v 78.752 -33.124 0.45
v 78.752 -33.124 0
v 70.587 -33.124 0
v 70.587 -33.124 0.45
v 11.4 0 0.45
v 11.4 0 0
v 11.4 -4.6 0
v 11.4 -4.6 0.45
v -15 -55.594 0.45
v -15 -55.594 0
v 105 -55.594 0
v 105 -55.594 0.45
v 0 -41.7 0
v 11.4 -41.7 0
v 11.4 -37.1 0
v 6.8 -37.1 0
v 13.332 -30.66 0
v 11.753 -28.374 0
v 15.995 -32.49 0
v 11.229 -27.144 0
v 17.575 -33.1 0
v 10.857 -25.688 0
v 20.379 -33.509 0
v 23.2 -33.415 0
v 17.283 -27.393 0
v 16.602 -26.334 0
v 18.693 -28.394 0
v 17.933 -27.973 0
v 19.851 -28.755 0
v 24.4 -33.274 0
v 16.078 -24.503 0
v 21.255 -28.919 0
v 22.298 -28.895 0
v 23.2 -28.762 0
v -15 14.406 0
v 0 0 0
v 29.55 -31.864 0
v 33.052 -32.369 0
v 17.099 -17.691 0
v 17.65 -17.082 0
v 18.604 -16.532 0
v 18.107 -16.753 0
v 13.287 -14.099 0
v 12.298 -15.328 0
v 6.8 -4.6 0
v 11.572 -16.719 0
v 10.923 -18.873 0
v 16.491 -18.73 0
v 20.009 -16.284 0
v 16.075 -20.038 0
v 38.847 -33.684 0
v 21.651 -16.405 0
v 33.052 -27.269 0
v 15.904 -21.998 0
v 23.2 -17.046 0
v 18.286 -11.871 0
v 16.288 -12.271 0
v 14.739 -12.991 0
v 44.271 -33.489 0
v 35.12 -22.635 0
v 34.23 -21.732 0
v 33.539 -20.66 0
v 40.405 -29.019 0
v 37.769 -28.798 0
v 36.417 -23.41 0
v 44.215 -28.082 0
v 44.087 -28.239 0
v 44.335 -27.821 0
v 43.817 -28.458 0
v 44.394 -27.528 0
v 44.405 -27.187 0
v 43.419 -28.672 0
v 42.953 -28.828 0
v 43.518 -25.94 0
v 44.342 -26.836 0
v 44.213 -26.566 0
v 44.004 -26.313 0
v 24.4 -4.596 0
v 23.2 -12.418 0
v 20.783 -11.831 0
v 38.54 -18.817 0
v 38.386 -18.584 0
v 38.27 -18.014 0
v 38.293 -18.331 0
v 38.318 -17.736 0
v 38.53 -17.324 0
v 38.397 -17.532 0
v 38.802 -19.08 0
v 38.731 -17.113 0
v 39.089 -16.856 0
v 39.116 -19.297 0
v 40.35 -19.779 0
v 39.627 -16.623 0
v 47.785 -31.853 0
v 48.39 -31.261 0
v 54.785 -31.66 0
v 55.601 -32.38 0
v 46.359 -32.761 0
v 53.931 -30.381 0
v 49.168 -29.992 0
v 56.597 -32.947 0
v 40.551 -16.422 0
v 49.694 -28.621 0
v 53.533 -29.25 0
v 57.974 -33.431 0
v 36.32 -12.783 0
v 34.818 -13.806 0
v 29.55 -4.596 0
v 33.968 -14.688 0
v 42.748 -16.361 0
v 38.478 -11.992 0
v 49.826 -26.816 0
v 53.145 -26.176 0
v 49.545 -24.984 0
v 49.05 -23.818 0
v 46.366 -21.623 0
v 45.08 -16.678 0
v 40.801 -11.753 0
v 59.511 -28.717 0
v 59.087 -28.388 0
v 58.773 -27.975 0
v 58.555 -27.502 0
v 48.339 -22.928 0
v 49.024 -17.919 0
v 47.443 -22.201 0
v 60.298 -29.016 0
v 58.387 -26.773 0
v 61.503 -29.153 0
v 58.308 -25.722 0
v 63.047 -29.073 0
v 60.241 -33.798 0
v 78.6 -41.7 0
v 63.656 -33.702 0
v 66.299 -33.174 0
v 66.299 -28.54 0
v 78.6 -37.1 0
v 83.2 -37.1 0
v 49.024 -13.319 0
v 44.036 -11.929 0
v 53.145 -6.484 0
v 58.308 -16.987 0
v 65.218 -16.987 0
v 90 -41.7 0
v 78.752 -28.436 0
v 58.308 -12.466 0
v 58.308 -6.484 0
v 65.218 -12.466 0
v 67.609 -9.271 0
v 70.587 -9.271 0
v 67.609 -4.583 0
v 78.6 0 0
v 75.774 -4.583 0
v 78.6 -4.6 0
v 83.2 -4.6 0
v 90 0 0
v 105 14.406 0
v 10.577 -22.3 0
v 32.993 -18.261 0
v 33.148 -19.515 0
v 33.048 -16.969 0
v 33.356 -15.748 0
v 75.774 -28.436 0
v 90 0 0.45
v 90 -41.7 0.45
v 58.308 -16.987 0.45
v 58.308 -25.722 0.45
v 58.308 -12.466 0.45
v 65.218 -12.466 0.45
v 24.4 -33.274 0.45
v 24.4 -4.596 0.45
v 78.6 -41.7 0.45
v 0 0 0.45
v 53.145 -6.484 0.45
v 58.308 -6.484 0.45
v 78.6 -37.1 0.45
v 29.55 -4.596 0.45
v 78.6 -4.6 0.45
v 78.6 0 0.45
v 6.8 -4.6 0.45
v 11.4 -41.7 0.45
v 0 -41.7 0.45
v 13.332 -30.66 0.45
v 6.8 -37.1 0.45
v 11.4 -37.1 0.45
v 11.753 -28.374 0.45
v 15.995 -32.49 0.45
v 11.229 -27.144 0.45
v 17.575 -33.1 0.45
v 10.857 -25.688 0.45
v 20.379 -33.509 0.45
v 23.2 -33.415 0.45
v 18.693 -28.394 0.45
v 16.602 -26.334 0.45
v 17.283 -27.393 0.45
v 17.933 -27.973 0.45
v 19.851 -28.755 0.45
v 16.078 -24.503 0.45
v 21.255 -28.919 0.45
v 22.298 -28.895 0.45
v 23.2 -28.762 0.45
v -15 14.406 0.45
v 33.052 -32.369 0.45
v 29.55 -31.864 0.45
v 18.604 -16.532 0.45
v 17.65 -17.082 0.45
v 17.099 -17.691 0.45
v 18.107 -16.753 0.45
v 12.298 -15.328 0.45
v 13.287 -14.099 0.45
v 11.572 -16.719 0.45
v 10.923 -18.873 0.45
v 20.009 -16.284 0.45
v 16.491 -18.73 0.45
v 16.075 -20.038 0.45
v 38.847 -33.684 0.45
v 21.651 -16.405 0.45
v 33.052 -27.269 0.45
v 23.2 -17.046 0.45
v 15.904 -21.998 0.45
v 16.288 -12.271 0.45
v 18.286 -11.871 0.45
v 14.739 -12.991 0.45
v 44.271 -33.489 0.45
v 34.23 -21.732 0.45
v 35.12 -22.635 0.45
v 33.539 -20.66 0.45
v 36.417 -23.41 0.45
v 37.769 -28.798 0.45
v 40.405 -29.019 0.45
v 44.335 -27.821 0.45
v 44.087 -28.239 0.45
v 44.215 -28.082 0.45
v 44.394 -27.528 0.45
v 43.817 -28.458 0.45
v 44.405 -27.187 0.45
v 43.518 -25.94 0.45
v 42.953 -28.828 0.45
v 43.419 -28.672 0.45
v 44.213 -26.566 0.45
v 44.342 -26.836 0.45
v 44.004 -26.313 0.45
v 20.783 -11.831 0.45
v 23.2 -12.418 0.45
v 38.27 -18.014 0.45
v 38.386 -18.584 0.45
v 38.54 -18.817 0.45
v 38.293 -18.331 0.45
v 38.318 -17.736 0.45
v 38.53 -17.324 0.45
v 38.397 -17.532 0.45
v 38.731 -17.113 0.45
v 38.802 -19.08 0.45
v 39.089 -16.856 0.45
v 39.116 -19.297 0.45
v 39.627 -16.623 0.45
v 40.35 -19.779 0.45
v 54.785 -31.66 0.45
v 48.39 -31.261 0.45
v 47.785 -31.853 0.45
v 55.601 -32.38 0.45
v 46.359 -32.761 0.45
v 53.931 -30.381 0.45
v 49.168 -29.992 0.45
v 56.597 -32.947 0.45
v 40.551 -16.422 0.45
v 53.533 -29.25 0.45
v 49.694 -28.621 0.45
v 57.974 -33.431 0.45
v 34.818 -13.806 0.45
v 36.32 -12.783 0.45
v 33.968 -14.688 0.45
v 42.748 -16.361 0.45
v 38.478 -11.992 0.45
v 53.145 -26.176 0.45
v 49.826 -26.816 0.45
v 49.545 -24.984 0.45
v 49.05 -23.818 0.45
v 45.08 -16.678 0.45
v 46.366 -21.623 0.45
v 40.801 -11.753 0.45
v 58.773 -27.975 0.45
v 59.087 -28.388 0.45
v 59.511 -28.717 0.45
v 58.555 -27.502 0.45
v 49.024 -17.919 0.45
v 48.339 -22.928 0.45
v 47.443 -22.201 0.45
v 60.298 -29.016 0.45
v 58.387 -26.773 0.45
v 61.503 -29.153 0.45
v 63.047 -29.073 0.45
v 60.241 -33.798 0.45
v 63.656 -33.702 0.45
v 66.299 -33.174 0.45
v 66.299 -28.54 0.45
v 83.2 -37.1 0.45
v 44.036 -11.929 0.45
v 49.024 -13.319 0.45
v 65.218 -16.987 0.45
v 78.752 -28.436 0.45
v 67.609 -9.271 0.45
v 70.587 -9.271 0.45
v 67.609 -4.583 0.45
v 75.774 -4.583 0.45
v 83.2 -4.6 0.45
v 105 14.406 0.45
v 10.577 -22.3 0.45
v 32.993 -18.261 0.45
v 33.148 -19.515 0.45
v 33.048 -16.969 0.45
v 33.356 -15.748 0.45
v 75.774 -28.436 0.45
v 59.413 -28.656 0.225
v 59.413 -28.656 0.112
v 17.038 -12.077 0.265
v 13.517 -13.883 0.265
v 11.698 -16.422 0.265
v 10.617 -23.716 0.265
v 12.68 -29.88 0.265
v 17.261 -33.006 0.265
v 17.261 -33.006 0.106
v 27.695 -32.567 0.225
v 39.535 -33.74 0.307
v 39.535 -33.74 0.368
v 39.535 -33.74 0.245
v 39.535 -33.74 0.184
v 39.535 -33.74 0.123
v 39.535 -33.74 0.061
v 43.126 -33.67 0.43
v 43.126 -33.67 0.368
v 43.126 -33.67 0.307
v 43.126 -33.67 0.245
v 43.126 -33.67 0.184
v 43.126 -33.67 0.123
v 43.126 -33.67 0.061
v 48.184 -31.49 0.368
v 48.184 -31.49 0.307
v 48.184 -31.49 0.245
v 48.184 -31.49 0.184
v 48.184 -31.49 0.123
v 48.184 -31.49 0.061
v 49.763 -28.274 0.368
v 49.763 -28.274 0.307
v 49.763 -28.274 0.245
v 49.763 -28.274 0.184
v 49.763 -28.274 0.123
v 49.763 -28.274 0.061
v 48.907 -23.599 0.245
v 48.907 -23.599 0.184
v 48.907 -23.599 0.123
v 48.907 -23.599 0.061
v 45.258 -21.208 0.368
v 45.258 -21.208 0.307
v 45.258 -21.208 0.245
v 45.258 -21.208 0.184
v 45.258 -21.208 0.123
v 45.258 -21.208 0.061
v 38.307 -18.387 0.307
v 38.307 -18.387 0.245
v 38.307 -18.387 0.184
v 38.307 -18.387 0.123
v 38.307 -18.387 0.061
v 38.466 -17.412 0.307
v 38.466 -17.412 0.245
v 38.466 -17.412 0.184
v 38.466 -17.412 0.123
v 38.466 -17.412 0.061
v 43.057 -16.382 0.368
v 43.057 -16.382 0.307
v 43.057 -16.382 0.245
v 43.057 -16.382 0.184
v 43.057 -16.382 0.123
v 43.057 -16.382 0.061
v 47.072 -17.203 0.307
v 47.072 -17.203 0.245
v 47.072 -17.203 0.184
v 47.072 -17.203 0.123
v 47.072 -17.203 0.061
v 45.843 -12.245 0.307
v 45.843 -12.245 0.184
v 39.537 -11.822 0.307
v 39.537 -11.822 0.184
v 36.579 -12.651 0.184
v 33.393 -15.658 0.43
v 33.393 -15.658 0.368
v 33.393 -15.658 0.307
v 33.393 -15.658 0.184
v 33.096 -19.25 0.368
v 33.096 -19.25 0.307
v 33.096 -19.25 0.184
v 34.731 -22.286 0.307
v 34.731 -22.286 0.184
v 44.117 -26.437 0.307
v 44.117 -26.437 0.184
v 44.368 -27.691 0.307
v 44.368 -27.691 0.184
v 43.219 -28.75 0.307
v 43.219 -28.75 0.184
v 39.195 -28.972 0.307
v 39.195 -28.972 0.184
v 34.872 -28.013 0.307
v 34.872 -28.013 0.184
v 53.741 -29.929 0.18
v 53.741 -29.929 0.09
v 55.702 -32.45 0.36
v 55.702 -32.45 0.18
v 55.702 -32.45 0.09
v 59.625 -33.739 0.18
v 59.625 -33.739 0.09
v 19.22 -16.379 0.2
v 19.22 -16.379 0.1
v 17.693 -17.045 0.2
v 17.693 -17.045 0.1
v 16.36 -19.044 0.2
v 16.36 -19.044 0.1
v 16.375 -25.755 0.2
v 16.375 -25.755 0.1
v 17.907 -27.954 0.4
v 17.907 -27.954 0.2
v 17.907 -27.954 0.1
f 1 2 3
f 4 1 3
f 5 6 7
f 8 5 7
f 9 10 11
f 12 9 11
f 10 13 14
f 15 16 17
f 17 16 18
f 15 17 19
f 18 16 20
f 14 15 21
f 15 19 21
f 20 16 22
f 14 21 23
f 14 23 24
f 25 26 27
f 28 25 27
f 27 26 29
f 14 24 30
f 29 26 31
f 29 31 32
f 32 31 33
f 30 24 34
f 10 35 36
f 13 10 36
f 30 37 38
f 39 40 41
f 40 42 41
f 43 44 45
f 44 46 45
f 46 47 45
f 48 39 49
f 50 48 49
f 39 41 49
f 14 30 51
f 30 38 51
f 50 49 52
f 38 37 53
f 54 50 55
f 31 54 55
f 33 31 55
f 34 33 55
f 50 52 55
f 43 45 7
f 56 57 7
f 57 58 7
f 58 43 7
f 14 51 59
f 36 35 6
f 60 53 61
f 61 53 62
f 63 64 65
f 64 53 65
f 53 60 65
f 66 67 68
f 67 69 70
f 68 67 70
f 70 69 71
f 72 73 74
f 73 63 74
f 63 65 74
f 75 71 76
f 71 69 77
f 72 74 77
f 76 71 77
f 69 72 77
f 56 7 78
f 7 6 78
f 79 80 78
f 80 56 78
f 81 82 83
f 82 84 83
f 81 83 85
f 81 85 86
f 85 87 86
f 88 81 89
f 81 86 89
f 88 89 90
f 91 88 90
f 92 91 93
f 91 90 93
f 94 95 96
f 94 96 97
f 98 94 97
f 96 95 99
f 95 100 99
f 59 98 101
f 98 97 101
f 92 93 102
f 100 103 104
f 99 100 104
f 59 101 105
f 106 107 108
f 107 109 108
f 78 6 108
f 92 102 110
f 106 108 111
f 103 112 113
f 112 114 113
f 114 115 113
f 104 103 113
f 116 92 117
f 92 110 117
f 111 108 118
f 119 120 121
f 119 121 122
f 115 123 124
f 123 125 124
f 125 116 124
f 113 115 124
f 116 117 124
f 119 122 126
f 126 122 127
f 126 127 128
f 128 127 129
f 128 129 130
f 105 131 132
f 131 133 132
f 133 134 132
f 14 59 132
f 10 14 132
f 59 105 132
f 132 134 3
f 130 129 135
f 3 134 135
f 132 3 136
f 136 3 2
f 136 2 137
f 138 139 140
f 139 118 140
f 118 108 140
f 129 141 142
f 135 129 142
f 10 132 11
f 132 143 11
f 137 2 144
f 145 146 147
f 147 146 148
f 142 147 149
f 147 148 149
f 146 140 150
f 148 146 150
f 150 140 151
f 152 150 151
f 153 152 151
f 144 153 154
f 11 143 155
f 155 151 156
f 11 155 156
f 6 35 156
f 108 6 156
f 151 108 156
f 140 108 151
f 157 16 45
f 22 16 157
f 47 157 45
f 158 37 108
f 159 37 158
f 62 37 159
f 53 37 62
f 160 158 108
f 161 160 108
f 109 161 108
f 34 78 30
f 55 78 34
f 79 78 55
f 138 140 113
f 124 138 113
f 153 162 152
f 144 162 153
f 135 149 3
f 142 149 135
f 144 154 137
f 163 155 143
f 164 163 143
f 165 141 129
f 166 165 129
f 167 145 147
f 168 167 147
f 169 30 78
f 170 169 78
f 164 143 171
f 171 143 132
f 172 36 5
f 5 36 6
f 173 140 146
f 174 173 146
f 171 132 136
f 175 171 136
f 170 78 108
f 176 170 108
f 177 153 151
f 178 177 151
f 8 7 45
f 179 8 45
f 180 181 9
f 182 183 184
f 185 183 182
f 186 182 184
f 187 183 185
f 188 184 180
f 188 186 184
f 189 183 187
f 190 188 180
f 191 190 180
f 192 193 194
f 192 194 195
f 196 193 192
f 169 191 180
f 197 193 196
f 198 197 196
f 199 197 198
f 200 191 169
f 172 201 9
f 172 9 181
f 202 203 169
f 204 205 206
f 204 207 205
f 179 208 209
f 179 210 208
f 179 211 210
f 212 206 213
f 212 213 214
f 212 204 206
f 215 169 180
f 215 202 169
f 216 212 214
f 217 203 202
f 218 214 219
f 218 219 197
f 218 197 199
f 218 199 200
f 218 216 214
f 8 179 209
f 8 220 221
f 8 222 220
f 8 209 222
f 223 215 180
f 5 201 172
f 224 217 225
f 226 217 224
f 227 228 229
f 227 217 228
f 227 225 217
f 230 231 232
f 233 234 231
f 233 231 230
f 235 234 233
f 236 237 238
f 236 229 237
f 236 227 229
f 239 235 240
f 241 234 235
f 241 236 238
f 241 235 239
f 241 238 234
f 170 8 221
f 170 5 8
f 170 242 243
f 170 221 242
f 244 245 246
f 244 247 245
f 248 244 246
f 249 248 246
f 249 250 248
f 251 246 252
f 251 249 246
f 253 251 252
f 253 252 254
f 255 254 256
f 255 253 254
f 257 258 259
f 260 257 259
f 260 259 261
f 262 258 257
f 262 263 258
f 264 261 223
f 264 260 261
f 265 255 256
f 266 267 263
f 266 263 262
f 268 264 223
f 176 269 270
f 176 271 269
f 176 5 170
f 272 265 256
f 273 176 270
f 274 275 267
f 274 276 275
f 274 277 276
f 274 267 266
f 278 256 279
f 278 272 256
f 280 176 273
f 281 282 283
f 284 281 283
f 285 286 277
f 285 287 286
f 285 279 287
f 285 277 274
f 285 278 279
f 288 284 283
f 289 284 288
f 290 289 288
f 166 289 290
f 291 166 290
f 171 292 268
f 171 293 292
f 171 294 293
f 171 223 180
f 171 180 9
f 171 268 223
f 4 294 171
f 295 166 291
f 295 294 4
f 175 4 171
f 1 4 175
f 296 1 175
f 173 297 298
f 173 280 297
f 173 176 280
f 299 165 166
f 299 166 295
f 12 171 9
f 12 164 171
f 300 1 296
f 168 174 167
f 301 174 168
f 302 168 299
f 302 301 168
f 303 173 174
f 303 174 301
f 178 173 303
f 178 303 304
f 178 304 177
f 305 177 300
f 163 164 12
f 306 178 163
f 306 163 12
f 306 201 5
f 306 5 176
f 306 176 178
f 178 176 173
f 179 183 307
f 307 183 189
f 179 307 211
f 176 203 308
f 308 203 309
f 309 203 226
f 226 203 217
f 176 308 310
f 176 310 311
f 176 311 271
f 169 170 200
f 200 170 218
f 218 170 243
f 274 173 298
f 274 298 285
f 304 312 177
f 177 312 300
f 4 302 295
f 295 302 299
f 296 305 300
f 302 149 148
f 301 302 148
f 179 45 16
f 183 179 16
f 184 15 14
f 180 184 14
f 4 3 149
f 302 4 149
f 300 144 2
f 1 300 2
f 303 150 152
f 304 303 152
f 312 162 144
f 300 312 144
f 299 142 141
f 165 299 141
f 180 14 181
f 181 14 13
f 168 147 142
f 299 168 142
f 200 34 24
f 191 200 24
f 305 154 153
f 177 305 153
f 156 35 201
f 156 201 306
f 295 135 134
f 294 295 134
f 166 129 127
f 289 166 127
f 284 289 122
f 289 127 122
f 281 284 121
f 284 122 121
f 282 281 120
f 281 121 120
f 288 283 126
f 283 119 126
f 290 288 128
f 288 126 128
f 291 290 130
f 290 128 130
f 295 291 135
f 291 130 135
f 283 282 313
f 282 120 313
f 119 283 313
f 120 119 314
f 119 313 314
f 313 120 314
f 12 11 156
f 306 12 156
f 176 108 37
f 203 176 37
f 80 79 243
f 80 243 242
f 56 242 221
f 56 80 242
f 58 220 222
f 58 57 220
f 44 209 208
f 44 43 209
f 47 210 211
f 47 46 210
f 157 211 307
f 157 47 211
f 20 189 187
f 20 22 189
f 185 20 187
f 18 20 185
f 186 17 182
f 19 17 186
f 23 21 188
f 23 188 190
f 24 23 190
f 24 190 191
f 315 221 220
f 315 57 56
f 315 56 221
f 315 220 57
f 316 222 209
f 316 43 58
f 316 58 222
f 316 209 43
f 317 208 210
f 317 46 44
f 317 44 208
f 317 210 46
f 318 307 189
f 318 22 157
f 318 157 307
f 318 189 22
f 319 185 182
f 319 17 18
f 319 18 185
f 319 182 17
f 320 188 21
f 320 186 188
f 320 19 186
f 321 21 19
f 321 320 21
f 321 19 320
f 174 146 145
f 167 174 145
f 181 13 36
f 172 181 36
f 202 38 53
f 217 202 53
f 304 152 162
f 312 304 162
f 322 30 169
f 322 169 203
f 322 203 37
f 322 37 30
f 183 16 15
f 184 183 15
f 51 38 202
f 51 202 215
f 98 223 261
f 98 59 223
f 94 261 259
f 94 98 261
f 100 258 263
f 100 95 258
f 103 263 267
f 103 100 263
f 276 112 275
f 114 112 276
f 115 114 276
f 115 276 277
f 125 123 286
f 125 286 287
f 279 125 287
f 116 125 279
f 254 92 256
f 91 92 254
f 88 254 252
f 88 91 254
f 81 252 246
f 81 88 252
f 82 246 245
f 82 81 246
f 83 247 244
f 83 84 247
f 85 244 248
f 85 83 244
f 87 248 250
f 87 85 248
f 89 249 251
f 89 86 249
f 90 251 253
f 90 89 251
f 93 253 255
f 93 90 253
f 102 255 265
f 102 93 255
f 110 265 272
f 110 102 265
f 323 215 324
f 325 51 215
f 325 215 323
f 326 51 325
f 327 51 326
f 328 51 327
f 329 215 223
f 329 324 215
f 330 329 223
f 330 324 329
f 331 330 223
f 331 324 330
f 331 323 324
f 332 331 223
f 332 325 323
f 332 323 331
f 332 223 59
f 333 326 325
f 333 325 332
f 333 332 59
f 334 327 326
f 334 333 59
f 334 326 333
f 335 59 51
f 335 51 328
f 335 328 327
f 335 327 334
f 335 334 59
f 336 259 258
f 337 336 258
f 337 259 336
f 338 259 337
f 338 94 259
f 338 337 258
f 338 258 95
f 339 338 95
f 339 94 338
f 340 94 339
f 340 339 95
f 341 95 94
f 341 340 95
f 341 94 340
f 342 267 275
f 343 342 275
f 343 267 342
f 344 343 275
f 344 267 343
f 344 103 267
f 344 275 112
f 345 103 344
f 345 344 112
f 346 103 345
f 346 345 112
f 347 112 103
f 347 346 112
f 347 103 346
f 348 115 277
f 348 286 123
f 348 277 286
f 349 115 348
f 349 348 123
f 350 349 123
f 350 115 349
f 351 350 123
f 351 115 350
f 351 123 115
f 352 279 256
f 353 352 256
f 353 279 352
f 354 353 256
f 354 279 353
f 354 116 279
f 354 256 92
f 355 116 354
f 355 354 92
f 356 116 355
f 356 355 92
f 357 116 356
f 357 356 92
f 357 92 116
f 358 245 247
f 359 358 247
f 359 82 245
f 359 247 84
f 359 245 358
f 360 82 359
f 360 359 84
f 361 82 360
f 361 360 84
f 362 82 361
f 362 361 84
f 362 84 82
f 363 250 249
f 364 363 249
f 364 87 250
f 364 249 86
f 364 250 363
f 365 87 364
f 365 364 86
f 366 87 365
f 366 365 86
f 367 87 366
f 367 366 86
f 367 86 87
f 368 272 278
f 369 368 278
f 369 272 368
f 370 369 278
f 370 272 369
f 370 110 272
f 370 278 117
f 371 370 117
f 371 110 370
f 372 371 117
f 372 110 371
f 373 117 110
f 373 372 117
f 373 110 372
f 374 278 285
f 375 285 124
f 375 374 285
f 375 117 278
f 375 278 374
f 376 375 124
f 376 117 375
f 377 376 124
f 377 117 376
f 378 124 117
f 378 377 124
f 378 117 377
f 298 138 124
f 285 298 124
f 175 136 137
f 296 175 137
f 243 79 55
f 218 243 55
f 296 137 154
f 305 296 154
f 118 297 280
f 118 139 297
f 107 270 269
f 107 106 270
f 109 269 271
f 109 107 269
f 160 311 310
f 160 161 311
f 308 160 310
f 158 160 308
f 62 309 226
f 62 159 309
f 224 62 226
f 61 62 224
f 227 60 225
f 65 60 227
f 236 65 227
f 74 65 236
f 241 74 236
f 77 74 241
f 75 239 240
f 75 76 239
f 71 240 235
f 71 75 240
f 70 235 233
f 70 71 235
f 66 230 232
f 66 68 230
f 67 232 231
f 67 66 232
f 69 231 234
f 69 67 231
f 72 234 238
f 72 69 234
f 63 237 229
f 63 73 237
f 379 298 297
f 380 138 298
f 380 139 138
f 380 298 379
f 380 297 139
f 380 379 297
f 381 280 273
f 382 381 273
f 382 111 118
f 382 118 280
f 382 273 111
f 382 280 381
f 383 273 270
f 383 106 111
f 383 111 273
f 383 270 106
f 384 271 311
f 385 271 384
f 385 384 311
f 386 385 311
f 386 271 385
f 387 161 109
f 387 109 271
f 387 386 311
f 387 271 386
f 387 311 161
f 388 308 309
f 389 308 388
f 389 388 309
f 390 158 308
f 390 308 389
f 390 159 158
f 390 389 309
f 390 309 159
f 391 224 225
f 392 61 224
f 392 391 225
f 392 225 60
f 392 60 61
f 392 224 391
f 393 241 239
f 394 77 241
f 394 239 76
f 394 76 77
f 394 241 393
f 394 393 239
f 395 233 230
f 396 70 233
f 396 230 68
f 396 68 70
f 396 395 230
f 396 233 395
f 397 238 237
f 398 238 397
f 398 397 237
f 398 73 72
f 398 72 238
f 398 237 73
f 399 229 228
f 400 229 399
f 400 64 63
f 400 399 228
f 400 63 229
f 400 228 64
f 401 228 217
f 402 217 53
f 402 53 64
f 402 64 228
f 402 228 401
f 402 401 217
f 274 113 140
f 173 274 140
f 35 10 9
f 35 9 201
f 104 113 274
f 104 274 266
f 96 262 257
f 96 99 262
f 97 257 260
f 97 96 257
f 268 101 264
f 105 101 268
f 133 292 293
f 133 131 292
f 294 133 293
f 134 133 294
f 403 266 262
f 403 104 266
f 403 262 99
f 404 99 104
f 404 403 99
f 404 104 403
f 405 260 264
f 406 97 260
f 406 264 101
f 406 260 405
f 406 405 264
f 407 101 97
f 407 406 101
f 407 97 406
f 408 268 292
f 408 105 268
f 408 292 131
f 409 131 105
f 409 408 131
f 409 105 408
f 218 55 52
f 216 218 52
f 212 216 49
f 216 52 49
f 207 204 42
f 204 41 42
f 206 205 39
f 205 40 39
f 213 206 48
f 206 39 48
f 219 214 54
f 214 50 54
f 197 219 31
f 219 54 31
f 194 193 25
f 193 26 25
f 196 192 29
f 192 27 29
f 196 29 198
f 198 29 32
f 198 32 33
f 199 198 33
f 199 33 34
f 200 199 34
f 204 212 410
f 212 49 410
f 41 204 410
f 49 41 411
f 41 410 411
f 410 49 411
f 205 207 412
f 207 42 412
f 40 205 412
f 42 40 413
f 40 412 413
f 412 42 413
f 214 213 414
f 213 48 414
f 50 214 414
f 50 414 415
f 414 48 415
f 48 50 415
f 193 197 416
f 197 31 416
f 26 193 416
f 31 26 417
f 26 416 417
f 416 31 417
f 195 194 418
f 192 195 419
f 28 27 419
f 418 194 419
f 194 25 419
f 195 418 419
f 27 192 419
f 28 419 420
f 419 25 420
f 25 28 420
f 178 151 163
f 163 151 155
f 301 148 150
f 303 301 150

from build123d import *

# Parameters (mm, degrees)
F0_W     = 120
F0_H     = 70
F1_DEPTH = 0.45


with BuildPart() as f1:
    # F0 (on Top) → F1 (new body)
    with BuildSketch(Plane.XY):
        with Locations((45, -20.5940017916)):
            Rectangle(F0_W, F0_H)
        Polygon((0, -41.7), (0, 0), (11.4, 0), (11.4, -4.6), (6.8, -4.6), (6.8, -37.1), (11.4, -37.1), (11.4, -41.7), align=None, mode=Mode.SUBTRACT)
        with BuildLine():
            add(Edge.make_bspline(
                [(49.0244626999, -13.3191114292), (47.9252540228, -12.906444504), (45.8538191761, -12.1287826579), (43.2663612955, -11.8214869365), (39.5019255003, -11.631129664), (36.5730189912, -12.474864537), (34.4038092797, -14.0180676075), (33.2803945568, -15.5930284945), (32.9299313394, -17.3974807024), (33.0247430864, -19.2644407239), (33.5209522718, -20.8596497074), (34.7867749379, -22.4849974638), (36.6856103348, -23.7661448154), (43.3610194247, -25.835227061), (43.6360937065, -26.0009190891), (44.4483901258, -26.6274642223), (44.4191952723, -27.7079845936), (44.1482479669, -28.2800521941), (43.1848069992, -28.8696367955), (41.5439042842, -29.0236538432), (39.1831019682, -29.0416993352), (36.7331527398, -28.6512756574), (34.8529455055, -27.9989479915), (33.7116681039, -27.6340674609), (33.0519974232, -27.2688921541)],
                knots=[0, 0, 0, 0, 0.058697372, 0.110636302, 0.1722947346, 0.2284332174, 0.2798718904, 0.3236345653, 0.3664750805, 0.4100134235, 0.4512254168, 0.4946726294, 0.5470853711, 0.6298974275, 0.6496534035, 0.6796934664, 0.7119684935, 0.7367878326, 0.7691770555, 0.8102104611, 0.8598398129, 0.9104936405, 0.9550849744, 1, 1, 1, 1], degree=3))
            Line((49.0244626999, -13.3191114292), (49.0244626999, -17.9191114292))
            add(Edge.make_bspline(
                [(33.0519974232, -32.3688276112), (34.1448702365, -32.7791159149), (36.314967668, -33.3456194979), (39.4969050095, -33.8356604205), (43.1432406988, -33.7773095484), (45.8271296831, -33.174718956), (48.3165885612, -31.6492934267), (49.1983157044, -29.9710049135), (49.9420651714, -28.3049662333), (49.79063894, -25.4236511303), (49.0431184959, -23.5511442072), (47.5388875476, -22.13600504), (45.3640309594, -21.1075226691), (40.0694021947, -19.7898320167), (38.8075306127, -19.1806229476), (38.208696017, -18.4303924596), (38.2896539771, -17.6530204289), (38.6151905672, -17.1738203692), (39.2832700379, -16.6781449879), (40.7243338821, -16.3228659689), (43.0712727288, -16.3146254531), (45.3270845524, -16.6878851711), (47.081843861, -17.216618614), (48.3507692652, -17.5526122014), (49.0244626999, -17.9191114292)],
                knots=[0, 0, 0, 0, 0.058359039, 0.1154356138, 0.1754636421, 0.2284750487, 0.2813111382, 0.3239950225, 0.3664154319, 0.4195269018, 0.4644553309, 0.5077062304, 0.5583887508, 0.6322445019, 0.6696988518, 0.6985266315, 0.7252936001, 0.7488452919, 0.7766927527, 0.8147944532, 0.8637433809, 0.9118129111, 0.9543219664, 1, 1, 1, 1], degree=3))
            Line((33.0519974232, -32.3688276112), (33.0519974232, -27.2688921541))
        make_face(mode=Mode.SUBTRACT)
        Polygon((78.6, 0), (90, 0), (90, -41.7), (78.6, -41.7), (78.6, -37.1), (83.2, -37.1), (83.2, -4.6), (78.6, -4.6), align=None, mode=Mode.SUBTRACT)
        with BuildLine():
            Line((24.4, -12.945509365), (24.4, -4.5957448892))
            Line((24.4, -4.5957448892), (29.55, -4.5957448892))
            Line((29.55, -4.5957448892), (29.55, -31.8635366857))
            add(Edge.make_bspline(
                [(24.4, -33.273992168), (25.7004217309, -33.0922522053), (27.7272105077, -32.6338796797), (28.9837485789, -32.1028445251), (29.55, -31.8635366857)],
                knots=[0.8919132181, 0.8919132181, 0.8919132181, 0.8919132181, 0.9512913353, 1, 1, 1, 1], degree=3))
            add(Edge.make_bspline(
                [(23.2, -33.4152791466), (23.3678544551, -33.3992036896), (23.7773773577, -33.3560077475), (24.1712775661, -33.305957188), (24.4, -33.273992168)],
                knots=[0.8743711311, 0.8743711311, 0.8743711311, 0.8743711311, 0.8814696004, 0.8919132181, 0.8919132181, 0.8919132181, 0.8919132181], degree=3))
            add(Edge.make_bspline(
                [(23.2, -12.4184105557), (22.353955123, -12.0982391249), (20.300020209, -11.5945459591), (17.0381857044, -11.9837518911), (15.2882745219, -12.5928346976), (13.4525169563, -13.8091804411), (12.4090514075, -15.0976781805), (11.6457469539, -16.3928656673), (11.0475767308, -18.1975733355), (10.7397463029, -19.7474709206), (10.5494624236, -21.6780066895), (10.5907092319, -23.6852864971), (10.7317916801, -24.9786265639), (10.9252988791, -26.1331634083), (11.4326593609, -27.9805441503), (12.6853868333, -29.9349062983), (13.4927203062, -30.9317017708), (17.1614801598, -33.6005005571), (21.2917534357, -33.598032328), (23.2, -33.4152791466)],
                knots=[0.0221470182, 0.0221470182, 0.0221470182, 0.0221470182, 0.0688583105, 0.1342185984, 0.1815176197, 0.2318671344, 0.2762183375, 0.3184817512, 0.3657448359, 0.4094062146, 0.4576825166, 0.5069153015, 0.5459015542, 0.5826468585, 0.630912445, 0.6827142916, 0.721811061, 0.7936724702, 0.8743711311, 0.8743711311, 0.8743711311, 0.8743711311], degree=3))
            add(Edge.make_bspline(
                [(24.4, -12.945509365), (24.0000077478, -12.7467932611), (23.6011315118, -12.5702120186), (23.2, -12.4184105557)],
                knots=[0, 0, 0, 0, 0.0221470182, 0.0221470182, 0.0221470182, 0.0221470182], degree=3))
        make_face(mode=Mode.SUBTRACT)
        with BuildLine():
            Line((53.145006299, -26.1756554246), (53.145006299, -6.4838272519))
            Line((53.145006299, -6.4838272519), (58.3082959056, -6.4838272519))
            Line((58.3082959056, -6.4838272519), (58.3082959056, -12.4658066779))
            Line((58.3082959056, -12.4658066779), (65.2180537581, -12.4658066779))
            Line((65.2180537581, -12.4658066779), (65.2180537581, -16.9874373823))
            Line((65.2180537581, -16.9874373823), (58.3082959056, -16.9874373823))
            Line((58.3082959056, -16.9874373823), (58.3082959056, -25.7218927145))
            add(Edge.make_bspline(
                [(58.3082959056, -25.7218927145), (58.3334888825, -26.2973643936), (58.3827544385, -27.4227150129), (59.3116686079, -28.9341466626), (62.0281598419, -29.3490070761), (64.7435618449, -28.8348057875), (66.2991553545, -28.5402312875)],
                knots=[0, 0, 0, 0, 0.2083447249, 0.4074238121, 0.6605262606, 1, 1, 1, 1], degree=3))
            Line((66.2991553545, -28.5402312875), (66.2991553545, -33.1740155816))
            add(Edge.make_bspline(
                [(53.145006299, -26.1756554246), (53.2358369544, -27.4911719973), (53.409948025, -30.0128536688), (55.5148597984, -32.8072442601), (59.5941601298, -33.9744860927), (63.7570664009, -33.7975310959), (65.5239611327, -33.3641527612), (66.2991553545, -33.1740155816)],
                knots=[0, 0, 0, 0, 0.2071779154, 0.3971342991, 0.6130892101, 0.8302496446, 1, 1, 1, 1], degree=3))
        make_face(mode=Mode.SUBTRACT)
        Polygon((67.6088929176, -9.2706838623), (67.6088929176, -4.5832106844), (75.773589313, -4.5832106844), (75.773589313, -28.4363143146), (78.7517875433, -28.4363143146), (78.7517875433, -33.1237874925), (70.5870911479, -33.1237874925), (70.5870911479, -9.2706838623), align=None, mode=Mode.SUBTRACT)
        with BuildLine():
            Line((24.4, -17.8031000884), (24.4, -12.945509365))
            add(Edge.make_bspline(
                [(24.4, -12.945509365), (24.0000077478, -12.7467932611), (23.6011315118, -12.5702120186), (23.2, -12.4184105557)],
                knots=[0, 0, 0, 0, 0.0221470182, 0.0221470182, 0.0221470182, 0.0221470182], degree=3))
            Line((23.2, -12.4184105557), (23.2, -17.0455879614))
            add(Edge.make_bspline(
                [(24.4, -17.8031000884), (24.0022402396, -17.5399449322), (23.6059596063, -17.2765007792), (23.2, -17.0455879614)],
                knots=[0, 0, 0, 0, 0.0511785816, 0.0511785816, 0.0511785816, 0.0511785816], degree=3))
        make_face()
        with BuildLine():
            Line((24.4, -28.2964663305), (24.4, -17.8031000884))
            add(Edge.make_bspline(
                [(24.4, -17.8031000884), (24.0022402396, -17.5399449322), (23.6059596063, -17.2765007792), (23.2, -17.0455879614)],
                knots=[0, 0, 0, 0, 0.0511785816, 0.0511785816, 0.0511785816, 0.0511785816], degree=3))
            add(Edge.make_bspline(
                [(23.2, -17.0455879614), (22.7516360262, -16.7905552266), (21.4678852314, -16.1897862791), (19.2063290642, -16.2688510227), (17.5676310689, -16.8768174376), (16.1215821339, -19.077462511), (15.7954970165, -21.9061888295), (16.0875859247, -25.8206750037), (17.7102939979, -28.2053442092), (20.5074421883, -29.0313779131), (22.5106455816, -28.9201136135), (23.2, -28.7617774098)],
                knots=[0.0511785816, 0.0511785816, 0.0511785816, 0.0511785816, 0.1077030039, 0.2088663507, 0.2900991208, 0.3876303429, 0.4950144775, 0.6186836084, 0.7216787831, 0.8280179533, 0.9270929098, 0.9270929098, 0.9270929098, 0.9270929098], degree=3))
            add(Edge.make_bspline(
                [(23.2, -28.7617774098), (23.2258245155, -28.7558458373), (23.7254739394, -28.6364441767), (24.068939705, -28.4613592858), (24.4, -28.2964663305)],
                knots=[0.9270929098, 0.9270929098, 0.9270929098, 0.9270929098, 0.9308044443, 1, 1, 1, 1], degree=3))
        make_face()
        with BuildLine():
            add(Edge.make_bspline(
                [(23.2, -33.4152791466), (23.3678544551, -33.3992036896), (23.7773773577, -33.3560077475), (24.1712775661, -33.305957188), (24.4, -33.273992168)],
                knots=[0.8743711311, 0.8743711311, 0.8743711311, 0.8743711311, 0.8814696004, 0.8919132181, 0.8919132181, 0.8919132181, 0.8919132181], degree=3))
            Line((24.4, -33.273992168), (24.4, -28.2964663305))
            add(Edge.make_bspline(
                [(23.2, -28.7617774098), (23.2258245155, -28.7558458373), (23.7254739394, -28.6364441767), (24.068939705, -28.4613592858), (24.4, -28.2964663305)],
                knots=[0.9270929098, 0.9270929098, 0.9270929098, 0.9270929098, 0.9308044443, 1, 1, 1, 1], degree=3))
            Line((23.2, -28.7617774098), (23.2, -33.4152791466))
        make_face()
    extrude(amount=F1_DEPTH)


solid = f1.part
